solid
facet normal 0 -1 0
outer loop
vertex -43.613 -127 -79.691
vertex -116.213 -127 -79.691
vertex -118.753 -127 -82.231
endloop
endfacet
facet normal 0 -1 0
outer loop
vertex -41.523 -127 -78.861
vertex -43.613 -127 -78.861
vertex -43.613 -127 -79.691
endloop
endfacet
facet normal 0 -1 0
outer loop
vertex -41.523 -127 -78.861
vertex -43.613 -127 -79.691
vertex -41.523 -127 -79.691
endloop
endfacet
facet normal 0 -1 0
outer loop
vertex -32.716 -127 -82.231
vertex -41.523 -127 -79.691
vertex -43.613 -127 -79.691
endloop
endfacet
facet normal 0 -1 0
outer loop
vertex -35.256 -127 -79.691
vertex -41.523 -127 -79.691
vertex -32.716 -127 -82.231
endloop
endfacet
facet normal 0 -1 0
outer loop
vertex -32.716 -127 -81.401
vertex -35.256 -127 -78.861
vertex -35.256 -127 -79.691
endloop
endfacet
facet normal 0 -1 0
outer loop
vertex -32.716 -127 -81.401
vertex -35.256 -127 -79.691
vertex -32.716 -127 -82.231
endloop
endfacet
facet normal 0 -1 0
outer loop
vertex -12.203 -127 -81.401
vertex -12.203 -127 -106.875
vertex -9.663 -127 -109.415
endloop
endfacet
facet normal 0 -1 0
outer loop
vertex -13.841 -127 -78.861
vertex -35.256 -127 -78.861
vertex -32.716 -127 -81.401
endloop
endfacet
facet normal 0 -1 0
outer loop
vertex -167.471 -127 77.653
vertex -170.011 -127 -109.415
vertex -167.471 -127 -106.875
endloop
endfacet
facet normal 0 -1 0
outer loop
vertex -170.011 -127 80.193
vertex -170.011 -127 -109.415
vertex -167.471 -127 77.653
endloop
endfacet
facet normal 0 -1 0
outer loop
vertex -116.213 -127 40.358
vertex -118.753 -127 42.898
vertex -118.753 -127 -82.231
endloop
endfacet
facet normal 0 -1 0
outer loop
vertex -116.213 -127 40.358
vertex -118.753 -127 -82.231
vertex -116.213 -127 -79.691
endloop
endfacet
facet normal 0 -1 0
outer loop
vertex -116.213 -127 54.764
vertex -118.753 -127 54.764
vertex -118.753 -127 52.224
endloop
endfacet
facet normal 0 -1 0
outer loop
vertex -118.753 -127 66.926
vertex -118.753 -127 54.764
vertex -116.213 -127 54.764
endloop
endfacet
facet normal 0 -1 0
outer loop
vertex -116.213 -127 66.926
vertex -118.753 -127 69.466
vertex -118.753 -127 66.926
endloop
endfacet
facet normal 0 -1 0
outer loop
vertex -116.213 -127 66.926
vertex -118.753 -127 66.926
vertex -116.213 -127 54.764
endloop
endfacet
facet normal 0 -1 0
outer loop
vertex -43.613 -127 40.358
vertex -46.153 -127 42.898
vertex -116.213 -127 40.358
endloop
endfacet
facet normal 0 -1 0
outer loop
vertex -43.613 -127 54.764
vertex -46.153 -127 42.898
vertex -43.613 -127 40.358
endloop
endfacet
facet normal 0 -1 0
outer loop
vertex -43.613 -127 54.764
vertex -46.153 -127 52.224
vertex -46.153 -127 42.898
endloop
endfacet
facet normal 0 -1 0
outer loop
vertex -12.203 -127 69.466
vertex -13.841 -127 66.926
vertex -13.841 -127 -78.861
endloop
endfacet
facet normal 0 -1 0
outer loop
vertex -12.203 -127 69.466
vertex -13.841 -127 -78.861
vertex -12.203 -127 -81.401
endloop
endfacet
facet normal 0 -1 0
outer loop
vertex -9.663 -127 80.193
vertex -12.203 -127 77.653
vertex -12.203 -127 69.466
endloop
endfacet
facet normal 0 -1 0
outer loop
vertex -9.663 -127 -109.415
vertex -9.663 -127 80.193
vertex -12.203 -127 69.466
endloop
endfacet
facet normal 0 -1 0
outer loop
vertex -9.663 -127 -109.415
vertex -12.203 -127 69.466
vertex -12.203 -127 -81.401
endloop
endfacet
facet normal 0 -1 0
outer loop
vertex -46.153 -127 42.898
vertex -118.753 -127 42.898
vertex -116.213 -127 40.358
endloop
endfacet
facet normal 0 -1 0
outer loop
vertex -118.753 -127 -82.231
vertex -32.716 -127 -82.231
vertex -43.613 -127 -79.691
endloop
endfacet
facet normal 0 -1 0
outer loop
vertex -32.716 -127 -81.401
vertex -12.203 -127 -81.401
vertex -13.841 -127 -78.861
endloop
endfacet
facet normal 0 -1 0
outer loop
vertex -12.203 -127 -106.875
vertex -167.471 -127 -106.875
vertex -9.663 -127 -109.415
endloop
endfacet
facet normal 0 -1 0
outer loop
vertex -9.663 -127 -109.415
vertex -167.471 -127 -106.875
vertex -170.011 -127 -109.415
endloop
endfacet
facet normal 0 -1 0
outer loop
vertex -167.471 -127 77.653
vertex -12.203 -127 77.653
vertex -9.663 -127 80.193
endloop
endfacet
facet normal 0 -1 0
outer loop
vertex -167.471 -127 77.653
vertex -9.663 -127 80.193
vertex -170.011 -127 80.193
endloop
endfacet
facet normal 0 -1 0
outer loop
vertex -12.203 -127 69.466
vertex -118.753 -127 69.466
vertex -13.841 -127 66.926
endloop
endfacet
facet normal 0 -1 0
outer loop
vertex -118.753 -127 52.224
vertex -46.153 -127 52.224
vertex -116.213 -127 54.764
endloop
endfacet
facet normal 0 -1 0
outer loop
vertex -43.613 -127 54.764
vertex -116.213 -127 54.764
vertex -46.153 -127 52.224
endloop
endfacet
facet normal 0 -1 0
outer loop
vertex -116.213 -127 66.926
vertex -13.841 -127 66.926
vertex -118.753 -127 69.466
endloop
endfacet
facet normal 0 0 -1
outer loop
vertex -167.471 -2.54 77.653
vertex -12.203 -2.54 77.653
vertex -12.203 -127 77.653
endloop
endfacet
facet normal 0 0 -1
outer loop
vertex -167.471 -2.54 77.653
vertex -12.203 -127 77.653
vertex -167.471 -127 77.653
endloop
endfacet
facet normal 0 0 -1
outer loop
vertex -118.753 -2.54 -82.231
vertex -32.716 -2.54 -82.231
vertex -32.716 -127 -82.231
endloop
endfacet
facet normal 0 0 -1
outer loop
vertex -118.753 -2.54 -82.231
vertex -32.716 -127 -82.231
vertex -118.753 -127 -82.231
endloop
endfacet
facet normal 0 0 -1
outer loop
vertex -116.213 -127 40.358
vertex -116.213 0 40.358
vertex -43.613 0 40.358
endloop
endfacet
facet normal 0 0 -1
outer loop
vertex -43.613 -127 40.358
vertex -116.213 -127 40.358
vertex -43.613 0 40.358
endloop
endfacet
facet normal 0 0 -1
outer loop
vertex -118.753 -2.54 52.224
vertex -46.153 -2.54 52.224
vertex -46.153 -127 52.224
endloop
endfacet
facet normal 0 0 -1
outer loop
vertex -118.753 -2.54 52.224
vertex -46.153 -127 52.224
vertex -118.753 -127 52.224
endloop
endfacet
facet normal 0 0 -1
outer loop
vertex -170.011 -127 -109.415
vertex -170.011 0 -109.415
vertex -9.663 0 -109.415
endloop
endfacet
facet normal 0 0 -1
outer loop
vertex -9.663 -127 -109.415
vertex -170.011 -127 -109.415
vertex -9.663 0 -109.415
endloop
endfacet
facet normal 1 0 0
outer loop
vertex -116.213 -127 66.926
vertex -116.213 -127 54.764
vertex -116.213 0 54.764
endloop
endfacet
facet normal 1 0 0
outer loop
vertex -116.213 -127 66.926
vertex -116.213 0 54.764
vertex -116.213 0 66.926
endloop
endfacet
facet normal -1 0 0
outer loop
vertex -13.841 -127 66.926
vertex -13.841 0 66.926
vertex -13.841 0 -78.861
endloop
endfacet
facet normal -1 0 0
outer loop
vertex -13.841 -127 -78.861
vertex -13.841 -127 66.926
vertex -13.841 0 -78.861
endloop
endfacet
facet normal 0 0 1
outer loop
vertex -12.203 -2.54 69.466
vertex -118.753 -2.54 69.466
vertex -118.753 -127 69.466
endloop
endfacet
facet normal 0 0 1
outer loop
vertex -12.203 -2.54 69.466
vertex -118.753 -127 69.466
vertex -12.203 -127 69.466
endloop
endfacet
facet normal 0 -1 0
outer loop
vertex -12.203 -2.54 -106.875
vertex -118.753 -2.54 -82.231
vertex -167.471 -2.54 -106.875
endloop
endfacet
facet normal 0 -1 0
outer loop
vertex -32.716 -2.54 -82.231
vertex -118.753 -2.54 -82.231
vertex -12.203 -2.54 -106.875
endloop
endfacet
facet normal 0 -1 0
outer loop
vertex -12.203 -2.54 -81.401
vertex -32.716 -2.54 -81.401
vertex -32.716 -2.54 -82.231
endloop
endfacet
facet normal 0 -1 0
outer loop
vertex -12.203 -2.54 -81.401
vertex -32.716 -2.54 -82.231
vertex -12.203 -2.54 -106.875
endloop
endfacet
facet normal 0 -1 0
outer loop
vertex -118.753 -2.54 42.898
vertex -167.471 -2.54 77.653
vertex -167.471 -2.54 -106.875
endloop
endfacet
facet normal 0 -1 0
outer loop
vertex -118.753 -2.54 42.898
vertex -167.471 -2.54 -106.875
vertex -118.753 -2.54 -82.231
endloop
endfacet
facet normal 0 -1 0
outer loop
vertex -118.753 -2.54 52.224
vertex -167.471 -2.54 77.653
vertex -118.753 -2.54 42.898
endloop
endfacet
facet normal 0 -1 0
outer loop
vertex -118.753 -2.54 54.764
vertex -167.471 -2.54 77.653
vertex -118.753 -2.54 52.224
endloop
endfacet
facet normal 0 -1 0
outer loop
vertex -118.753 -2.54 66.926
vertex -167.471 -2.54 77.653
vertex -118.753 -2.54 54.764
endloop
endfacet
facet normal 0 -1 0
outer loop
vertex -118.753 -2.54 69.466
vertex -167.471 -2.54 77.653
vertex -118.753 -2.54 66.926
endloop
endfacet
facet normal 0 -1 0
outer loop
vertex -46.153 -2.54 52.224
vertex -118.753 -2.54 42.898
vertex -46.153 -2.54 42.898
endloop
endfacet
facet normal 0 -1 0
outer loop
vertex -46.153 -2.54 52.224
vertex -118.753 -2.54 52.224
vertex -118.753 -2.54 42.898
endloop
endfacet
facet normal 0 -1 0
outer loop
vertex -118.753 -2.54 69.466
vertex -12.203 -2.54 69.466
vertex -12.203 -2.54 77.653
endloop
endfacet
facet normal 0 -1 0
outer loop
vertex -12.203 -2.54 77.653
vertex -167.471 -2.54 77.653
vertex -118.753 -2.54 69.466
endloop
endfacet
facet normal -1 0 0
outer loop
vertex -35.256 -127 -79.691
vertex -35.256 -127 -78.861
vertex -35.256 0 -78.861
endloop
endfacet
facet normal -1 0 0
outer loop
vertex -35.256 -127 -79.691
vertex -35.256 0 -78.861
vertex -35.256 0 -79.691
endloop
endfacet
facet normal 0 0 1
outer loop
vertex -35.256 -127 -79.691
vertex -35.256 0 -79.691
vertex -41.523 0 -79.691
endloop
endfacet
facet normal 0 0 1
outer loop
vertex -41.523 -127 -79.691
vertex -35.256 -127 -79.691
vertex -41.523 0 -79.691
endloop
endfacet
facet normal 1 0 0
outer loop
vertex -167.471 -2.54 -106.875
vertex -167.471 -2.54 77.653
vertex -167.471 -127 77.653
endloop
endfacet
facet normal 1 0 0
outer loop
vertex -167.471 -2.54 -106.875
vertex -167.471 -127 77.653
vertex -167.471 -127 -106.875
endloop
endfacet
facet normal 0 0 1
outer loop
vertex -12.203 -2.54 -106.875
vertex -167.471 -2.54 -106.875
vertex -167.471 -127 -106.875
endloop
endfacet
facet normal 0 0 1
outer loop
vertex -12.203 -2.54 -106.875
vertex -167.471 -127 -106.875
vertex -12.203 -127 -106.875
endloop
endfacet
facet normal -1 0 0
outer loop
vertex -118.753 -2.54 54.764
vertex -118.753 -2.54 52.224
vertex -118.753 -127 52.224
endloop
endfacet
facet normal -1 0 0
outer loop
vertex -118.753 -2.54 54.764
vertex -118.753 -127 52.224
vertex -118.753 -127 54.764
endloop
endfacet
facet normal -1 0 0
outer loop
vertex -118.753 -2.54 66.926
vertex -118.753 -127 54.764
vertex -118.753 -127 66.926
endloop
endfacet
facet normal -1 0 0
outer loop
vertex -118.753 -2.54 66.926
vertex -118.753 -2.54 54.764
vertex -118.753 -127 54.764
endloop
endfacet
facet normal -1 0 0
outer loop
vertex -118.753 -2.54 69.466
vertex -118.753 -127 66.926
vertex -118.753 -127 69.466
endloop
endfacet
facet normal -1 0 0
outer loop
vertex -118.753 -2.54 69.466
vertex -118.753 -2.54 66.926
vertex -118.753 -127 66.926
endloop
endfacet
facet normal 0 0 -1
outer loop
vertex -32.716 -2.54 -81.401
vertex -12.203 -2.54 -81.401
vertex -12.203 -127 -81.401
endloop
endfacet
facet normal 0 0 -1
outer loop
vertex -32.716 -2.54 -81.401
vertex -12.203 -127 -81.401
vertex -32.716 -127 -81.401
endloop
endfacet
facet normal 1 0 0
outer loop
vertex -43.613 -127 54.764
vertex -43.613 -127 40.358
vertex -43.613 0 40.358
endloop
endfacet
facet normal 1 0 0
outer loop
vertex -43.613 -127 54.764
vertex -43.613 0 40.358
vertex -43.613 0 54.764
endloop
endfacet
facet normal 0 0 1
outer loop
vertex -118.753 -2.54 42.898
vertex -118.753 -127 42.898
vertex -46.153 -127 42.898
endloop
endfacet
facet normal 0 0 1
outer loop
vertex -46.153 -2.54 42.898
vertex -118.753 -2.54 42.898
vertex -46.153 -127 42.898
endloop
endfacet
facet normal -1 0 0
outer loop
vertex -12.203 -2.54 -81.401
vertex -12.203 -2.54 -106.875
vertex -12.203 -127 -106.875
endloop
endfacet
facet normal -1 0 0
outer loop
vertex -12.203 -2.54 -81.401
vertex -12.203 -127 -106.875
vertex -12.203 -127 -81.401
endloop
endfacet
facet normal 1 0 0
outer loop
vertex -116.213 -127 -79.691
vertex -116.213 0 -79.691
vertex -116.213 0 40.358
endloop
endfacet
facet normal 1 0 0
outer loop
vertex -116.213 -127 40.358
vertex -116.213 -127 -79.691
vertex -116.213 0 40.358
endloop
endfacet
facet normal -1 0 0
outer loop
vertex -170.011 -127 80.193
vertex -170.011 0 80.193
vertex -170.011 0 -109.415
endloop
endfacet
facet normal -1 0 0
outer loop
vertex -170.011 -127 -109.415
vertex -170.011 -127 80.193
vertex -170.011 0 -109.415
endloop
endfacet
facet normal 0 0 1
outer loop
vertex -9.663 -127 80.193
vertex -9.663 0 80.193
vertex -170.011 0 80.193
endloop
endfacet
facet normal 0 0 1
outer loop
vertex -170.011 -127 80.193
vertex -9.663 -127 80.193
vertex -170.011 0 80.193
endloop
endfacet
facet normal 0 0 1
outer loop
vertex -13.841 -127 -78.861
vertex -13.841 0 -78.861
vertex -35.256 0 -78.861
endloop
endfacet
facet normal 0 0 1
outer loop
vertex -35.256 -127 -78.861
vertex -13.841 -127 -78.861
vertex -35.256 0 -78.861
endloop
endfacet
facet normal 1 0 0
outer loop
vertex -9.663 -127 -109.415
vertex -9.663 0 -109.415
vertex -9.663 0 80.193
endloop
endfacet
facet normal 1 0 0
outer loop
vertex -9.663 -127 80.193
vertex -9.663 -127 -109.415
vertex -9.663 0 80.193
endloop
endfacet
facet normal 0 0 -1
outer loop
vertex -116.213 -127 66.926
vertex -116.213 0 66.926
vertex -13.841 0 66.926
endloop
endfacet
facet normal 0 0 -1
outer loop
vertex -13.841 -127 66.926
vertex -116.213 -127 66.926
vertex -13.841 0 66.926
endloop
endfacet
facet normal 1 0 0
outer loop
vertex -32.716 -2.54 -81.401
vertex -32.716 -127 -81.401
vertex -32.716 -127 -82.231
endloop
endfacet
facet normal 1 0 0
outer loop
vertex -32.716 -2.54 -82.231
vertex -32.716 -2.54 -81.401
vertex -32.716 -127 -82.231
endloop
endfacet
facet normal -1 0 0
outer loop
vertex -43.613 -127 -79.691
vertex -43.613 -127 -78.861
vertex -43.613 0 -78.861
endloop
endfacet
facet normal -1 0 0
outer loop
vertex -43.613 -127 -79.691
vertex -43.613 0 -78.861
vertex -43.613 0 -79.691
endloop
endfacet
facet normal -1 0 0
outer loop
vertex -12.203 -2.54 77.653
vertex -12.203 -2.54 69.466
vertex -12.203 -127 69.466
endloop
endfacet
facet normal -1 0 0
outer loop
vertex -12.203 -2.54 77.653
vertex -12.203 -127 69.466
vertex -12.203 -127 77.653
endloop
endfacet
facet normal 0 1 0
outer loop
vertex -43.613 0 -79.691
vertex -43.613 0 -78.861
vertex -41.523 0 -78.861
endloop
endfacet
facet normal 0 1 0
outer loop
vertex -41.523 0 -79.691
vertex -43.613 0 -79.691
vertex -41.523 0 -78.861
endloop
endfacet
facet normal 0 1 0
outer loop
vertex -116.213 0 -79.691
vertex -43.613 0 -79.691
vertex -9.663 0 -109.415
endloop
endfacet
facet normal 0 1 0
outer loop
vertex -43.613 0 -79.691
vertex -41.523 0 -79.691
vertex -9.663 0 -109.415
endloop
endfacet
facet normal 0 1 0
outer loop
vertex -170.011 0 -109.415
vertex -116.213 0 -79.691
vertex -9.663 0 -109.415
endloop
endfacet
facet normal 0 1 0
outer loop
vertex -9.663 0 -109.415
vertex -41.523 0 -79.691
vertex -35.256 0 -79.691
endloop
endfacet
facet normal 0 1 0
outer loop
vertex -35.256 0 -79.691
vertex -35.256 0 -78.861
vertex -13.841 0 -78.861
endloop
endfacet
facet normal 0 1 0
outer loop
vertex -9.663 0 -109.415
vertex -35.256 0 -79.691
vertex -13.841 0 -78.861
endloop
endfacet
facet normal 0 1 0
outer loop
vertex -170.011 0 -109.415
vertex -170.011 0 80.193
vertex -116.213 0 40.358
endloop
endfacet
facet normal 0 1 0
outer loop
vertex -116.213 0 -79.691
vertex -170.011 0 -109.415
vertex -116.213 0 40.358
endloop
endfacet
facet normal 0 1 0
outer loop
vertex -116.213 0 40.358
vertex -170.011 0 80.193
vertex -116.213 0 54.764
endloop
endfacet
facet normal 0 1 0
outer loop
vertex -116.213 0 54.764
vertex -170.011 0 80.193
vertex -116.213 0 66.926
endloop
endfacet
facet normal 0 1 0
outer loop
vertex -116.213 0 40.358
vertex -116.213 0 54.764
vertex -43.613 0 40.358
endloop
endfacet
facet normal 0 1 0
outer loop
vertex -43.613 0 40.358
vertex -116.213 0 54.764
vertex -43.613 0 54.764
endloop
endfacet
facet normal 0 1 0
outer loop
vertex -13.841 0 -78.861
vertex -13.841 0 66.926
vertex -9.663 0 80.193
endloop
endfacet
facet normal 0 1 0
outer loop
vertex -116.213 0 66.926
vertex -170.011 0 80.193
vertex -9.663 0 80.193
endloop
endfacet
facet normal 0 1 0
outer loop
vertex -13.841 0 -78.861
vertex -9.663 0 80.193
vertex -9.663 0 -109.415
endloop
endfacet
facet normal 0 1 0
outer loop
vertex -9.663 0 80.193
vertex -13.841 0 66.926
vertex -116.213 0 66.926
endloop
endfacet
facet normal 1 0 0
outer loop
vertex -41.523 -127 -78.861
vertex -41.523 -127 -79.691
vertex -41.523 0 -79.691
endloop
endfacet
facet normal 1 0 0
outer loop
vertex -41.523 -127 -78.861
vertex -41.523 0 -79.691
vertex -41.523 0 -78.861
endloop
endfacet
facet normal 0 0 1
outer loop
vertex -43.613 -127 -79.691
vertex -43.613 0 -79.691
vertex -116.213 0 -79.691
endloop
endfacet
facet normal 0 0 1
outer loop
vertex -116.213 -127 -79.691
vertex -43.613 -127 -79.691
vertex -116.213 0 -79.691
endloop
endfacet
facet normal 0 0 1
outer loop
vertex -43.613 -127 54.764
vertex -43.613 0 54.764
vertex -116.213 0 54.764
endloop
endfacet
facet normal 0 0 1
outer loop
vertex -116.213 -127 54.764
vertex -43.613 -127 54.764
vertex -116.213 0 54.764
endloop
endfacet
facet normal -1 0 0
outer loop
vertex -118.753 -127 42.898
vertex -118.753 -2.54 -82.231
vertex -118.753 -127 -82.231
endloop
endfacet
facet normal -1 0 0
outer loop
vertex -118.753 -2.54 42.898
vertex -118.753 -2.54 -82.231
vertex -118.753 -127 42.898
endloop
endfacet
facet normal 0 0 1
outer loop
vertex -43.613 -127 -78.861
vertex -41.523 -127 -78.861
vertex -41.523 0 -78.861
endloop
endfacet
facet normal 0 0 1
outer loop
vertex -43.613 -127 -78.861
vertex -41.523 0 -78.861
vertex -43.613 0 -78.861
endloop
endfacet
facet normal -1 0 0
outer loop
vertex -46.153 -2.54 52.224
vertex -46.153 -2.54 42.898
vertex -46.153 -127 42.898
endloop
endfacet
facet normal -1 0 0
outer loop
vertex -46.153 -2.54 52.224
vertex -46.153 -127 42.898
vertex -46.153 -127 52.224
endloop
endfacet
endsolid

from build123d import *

# Parameters (mm, degrees)
F0_W        = 53.7975355983
F0_H        = 80.8182843029
F0_H_2      = 16.7721658945
F0_H_3      = 21.6287262738
F0_H_4      = 0.8304491639
F0_H_5      = 12.1622607112
F1_DEPTH    = 127
F2_T        = 2.54
F2_T3_DEPTH = 132.08


# Not quite as in the source:
# - a shell that OpenCascade refuses in one call is made with other operations: the cavity is built on its own and cut out


with BuildPart() as f1:
    # F0 (on Front) → F1 (new body)
    with BuildSketch(Plane.XZ):
        with Locations((-143.1119032204, -0.0506583601)):
            Rectangle(F0_W, F0_H)
        with Locations((-143.1119032204, -48.8458834589)):
            Rectangle(F0_W, F0_H_2)
        with Locations((-143.1119032204, -68.046329543)):
            Rectangle(F0_W, F0_H_3)
        Polygon((-170.0106710196, 54.7638610005), (-170.0106710196, 40.3584837914), (-116.2131354213, 40.3584837914), (-74.950940907, 40.3584837914), (-43.6125695705, 40.3584837914), (-43.6125695705, 54.7638610005), (-116.2131354213, 54.7638610005), align=None)
        with Locations((-143.1119032204, -79.2759172618)):
            Rectangle(F0_W, F0_H_4)
        with Locations((-143.1119032204, 60.8449913561)):
            Rectangle(F0_W, F0_H_5)
        Polygon((-116.2131354213, -79.6911418438), (-170.0106710196, -79.6911418438), (-170.0106710196, -109.4150468707), (-9.6626672894, -109.4150468707), (-9.6626672894, -78.8606926799), (-13.8411177322, -78.8606926799), (-35.2556705475, -78.8606926799), (-35.2556705475, -79.6911418438), (-41.5233448148, -79.6911418438), (-41.5233448148, -78.8606926799), (-43.6125695705, -78.8606926799), (-43.6125695705, -79.6911418438), (-74.950940907, -79.6911418438), align=None)
        Polygon((-170.0106710196, 80.1929235458), (-170.0106710196, 66.9261217117), (-116.2131354213, 66.9261217117), (-43.6125695705, 66.9261217117), (-13.8411177322, 66.9261217117), (-9.6626672894, 66.9261217117), (-9.6626672894, 80.1929235458), align=None)
        Polygon((-13.8411177322, 54.7638610005), (-13.8411177322, 40.3584837914), (-13.8411177322, 6.9799921475), (-13.8411177322, -32.6986536384), (-13.8411177322, -78.8606926799), (-9.6626672894, -78.8606926799), (-9.6626672894, 66.9261217117), (-13.8411177322, 66.9261217117), align=None)
    extrude(amount=F1_DEPTH)

    # F2: shell of thickness 2.54, made by hand


with BuildPart() as f2_core1:
    # F2_t2: copy of F1
    add(f1.part)

    # the walls: a layer under each face that stays
    f2_faces = [f2_core1.faces().sort_by_distance(p)[0] for p in [
        (-79.9128524959, -63.5, 40.3584837914),
        (-43.6125695705, -63.5, 47.5611723959),
        (-79.9128524959, -63.5, 54.7638610005),
        (-116.2131354213, -63.5, 60.8449913561),
        (-65.0271265768, -63.5, 66.9261217117),
        (-13.8411177322, -63.5, -5.9672854841),
        (-24.5483941399, -63.5, -78.8606926799),
        (-35.2556705475, -63.5, -79.2759172618),
        (-38.3895076811, -63.5, -79.6911418438),
        (-41.5233448148, -63.5, -79.2759172618),
        (-42.5679571927, -63.5, -78.8606926799),
        (-43.6125695705, -63.5, -79.2759172618),
        (-79.9128524959, -63.5, -79.6911418438),
        (-116.2131354213, -63.5, -19.6663290262),
        (-89.8366691545, -63.5, 80.1929235458),
        (-170.0106710196, -63.5, -14.6110616624),
        (-89.8366691545, -63.5, -109.4150468707),
        (-9.6626672894, -63.5, -14.6110616624),
        (-143.2860037312, 0, -77.813718468),
    ]]
    thicken(f2_faces, amount=-F2_T, mode=Mode.SUBTRACT)

    # F2_s4 → F2_t3 (cut)
    with BuildSketch(Plane.XZ.offset(-2.54)):
        Polygon((-116.1877354213, 40.3330837914), (-116.2131354213, 42.8984837914), (-118.7531354213, 42.8984837914), (-118.7531354213, 40.3584837914), align=None)
        Polygon((-116.1877354213, 54.7892610005), (-116.2131354213, 52.2238610005), (-118.7531354213, 52.2238610005), (-118.7531354213, 54.7638610005), align=None)
        Polygon((-116.1877354213, 66.9007217117), (-118.7531354213, 66.9261217117), (-118.7531354213, 69.4661217117), (-116.2131354213, 69.4661217117), align=None)
        Polygon((-13.8665177322, 66.9007217117), (-13.8411177322, 69.4661217117), (-11.3011177322, 69.4661217117), (-11.3011177322, 66.9261217117), align=None)
        Polygon((-13.8665177322, -78.8352926799), (-11.3011177322, -78.8606926799), (-11.3011177322, -81.4006926799), (-13.8411177322, -81.4006926799), align=None)
        Polygon((-35.2810705475, -79.6657418438), (-32.7156705475, -79.6911418438), (-32.7156705475, -82.2311418438), (-35.2556705475, -82.2311418438), align=None)
        Polygon((-41.4979448148, -79.6657418438), (-41.5233448148, -82.2311418438), (-44.0633448148, -82.2311418438), (-44.0633448148, -79.6911418438), align=None)
        Polygon((-43.6379695705, -79.6657418438), (-41.0725695705, -79.6911418438), (-41.0725695705, -82.2311418438), (-43.6125695705, -82.2311418438), align=None)
        Polygon((-116.1877354213, -79.6657418438), (-116.2131354213, -82.2311418438), (-118.7531354213, -82.2311418438), (-118.7531354213, -79.6911418438), align=None)
    extrude(amount=F2_T3_DEPTH, mode=Mode.SUBTRACT)


with BuildPart() as f1_1:
    add(f1.part)

    # what is left inside the walls is the cavity
    f2_cavity = [f2_core1.part.solids().sort_by_distance(p)[0] for p in [
        (-167.445271, -85.513333, -14.611062),
    ]]
    add(f2_cavity, mode=Mode.SUBTRACT)


solid = f1_1.part
